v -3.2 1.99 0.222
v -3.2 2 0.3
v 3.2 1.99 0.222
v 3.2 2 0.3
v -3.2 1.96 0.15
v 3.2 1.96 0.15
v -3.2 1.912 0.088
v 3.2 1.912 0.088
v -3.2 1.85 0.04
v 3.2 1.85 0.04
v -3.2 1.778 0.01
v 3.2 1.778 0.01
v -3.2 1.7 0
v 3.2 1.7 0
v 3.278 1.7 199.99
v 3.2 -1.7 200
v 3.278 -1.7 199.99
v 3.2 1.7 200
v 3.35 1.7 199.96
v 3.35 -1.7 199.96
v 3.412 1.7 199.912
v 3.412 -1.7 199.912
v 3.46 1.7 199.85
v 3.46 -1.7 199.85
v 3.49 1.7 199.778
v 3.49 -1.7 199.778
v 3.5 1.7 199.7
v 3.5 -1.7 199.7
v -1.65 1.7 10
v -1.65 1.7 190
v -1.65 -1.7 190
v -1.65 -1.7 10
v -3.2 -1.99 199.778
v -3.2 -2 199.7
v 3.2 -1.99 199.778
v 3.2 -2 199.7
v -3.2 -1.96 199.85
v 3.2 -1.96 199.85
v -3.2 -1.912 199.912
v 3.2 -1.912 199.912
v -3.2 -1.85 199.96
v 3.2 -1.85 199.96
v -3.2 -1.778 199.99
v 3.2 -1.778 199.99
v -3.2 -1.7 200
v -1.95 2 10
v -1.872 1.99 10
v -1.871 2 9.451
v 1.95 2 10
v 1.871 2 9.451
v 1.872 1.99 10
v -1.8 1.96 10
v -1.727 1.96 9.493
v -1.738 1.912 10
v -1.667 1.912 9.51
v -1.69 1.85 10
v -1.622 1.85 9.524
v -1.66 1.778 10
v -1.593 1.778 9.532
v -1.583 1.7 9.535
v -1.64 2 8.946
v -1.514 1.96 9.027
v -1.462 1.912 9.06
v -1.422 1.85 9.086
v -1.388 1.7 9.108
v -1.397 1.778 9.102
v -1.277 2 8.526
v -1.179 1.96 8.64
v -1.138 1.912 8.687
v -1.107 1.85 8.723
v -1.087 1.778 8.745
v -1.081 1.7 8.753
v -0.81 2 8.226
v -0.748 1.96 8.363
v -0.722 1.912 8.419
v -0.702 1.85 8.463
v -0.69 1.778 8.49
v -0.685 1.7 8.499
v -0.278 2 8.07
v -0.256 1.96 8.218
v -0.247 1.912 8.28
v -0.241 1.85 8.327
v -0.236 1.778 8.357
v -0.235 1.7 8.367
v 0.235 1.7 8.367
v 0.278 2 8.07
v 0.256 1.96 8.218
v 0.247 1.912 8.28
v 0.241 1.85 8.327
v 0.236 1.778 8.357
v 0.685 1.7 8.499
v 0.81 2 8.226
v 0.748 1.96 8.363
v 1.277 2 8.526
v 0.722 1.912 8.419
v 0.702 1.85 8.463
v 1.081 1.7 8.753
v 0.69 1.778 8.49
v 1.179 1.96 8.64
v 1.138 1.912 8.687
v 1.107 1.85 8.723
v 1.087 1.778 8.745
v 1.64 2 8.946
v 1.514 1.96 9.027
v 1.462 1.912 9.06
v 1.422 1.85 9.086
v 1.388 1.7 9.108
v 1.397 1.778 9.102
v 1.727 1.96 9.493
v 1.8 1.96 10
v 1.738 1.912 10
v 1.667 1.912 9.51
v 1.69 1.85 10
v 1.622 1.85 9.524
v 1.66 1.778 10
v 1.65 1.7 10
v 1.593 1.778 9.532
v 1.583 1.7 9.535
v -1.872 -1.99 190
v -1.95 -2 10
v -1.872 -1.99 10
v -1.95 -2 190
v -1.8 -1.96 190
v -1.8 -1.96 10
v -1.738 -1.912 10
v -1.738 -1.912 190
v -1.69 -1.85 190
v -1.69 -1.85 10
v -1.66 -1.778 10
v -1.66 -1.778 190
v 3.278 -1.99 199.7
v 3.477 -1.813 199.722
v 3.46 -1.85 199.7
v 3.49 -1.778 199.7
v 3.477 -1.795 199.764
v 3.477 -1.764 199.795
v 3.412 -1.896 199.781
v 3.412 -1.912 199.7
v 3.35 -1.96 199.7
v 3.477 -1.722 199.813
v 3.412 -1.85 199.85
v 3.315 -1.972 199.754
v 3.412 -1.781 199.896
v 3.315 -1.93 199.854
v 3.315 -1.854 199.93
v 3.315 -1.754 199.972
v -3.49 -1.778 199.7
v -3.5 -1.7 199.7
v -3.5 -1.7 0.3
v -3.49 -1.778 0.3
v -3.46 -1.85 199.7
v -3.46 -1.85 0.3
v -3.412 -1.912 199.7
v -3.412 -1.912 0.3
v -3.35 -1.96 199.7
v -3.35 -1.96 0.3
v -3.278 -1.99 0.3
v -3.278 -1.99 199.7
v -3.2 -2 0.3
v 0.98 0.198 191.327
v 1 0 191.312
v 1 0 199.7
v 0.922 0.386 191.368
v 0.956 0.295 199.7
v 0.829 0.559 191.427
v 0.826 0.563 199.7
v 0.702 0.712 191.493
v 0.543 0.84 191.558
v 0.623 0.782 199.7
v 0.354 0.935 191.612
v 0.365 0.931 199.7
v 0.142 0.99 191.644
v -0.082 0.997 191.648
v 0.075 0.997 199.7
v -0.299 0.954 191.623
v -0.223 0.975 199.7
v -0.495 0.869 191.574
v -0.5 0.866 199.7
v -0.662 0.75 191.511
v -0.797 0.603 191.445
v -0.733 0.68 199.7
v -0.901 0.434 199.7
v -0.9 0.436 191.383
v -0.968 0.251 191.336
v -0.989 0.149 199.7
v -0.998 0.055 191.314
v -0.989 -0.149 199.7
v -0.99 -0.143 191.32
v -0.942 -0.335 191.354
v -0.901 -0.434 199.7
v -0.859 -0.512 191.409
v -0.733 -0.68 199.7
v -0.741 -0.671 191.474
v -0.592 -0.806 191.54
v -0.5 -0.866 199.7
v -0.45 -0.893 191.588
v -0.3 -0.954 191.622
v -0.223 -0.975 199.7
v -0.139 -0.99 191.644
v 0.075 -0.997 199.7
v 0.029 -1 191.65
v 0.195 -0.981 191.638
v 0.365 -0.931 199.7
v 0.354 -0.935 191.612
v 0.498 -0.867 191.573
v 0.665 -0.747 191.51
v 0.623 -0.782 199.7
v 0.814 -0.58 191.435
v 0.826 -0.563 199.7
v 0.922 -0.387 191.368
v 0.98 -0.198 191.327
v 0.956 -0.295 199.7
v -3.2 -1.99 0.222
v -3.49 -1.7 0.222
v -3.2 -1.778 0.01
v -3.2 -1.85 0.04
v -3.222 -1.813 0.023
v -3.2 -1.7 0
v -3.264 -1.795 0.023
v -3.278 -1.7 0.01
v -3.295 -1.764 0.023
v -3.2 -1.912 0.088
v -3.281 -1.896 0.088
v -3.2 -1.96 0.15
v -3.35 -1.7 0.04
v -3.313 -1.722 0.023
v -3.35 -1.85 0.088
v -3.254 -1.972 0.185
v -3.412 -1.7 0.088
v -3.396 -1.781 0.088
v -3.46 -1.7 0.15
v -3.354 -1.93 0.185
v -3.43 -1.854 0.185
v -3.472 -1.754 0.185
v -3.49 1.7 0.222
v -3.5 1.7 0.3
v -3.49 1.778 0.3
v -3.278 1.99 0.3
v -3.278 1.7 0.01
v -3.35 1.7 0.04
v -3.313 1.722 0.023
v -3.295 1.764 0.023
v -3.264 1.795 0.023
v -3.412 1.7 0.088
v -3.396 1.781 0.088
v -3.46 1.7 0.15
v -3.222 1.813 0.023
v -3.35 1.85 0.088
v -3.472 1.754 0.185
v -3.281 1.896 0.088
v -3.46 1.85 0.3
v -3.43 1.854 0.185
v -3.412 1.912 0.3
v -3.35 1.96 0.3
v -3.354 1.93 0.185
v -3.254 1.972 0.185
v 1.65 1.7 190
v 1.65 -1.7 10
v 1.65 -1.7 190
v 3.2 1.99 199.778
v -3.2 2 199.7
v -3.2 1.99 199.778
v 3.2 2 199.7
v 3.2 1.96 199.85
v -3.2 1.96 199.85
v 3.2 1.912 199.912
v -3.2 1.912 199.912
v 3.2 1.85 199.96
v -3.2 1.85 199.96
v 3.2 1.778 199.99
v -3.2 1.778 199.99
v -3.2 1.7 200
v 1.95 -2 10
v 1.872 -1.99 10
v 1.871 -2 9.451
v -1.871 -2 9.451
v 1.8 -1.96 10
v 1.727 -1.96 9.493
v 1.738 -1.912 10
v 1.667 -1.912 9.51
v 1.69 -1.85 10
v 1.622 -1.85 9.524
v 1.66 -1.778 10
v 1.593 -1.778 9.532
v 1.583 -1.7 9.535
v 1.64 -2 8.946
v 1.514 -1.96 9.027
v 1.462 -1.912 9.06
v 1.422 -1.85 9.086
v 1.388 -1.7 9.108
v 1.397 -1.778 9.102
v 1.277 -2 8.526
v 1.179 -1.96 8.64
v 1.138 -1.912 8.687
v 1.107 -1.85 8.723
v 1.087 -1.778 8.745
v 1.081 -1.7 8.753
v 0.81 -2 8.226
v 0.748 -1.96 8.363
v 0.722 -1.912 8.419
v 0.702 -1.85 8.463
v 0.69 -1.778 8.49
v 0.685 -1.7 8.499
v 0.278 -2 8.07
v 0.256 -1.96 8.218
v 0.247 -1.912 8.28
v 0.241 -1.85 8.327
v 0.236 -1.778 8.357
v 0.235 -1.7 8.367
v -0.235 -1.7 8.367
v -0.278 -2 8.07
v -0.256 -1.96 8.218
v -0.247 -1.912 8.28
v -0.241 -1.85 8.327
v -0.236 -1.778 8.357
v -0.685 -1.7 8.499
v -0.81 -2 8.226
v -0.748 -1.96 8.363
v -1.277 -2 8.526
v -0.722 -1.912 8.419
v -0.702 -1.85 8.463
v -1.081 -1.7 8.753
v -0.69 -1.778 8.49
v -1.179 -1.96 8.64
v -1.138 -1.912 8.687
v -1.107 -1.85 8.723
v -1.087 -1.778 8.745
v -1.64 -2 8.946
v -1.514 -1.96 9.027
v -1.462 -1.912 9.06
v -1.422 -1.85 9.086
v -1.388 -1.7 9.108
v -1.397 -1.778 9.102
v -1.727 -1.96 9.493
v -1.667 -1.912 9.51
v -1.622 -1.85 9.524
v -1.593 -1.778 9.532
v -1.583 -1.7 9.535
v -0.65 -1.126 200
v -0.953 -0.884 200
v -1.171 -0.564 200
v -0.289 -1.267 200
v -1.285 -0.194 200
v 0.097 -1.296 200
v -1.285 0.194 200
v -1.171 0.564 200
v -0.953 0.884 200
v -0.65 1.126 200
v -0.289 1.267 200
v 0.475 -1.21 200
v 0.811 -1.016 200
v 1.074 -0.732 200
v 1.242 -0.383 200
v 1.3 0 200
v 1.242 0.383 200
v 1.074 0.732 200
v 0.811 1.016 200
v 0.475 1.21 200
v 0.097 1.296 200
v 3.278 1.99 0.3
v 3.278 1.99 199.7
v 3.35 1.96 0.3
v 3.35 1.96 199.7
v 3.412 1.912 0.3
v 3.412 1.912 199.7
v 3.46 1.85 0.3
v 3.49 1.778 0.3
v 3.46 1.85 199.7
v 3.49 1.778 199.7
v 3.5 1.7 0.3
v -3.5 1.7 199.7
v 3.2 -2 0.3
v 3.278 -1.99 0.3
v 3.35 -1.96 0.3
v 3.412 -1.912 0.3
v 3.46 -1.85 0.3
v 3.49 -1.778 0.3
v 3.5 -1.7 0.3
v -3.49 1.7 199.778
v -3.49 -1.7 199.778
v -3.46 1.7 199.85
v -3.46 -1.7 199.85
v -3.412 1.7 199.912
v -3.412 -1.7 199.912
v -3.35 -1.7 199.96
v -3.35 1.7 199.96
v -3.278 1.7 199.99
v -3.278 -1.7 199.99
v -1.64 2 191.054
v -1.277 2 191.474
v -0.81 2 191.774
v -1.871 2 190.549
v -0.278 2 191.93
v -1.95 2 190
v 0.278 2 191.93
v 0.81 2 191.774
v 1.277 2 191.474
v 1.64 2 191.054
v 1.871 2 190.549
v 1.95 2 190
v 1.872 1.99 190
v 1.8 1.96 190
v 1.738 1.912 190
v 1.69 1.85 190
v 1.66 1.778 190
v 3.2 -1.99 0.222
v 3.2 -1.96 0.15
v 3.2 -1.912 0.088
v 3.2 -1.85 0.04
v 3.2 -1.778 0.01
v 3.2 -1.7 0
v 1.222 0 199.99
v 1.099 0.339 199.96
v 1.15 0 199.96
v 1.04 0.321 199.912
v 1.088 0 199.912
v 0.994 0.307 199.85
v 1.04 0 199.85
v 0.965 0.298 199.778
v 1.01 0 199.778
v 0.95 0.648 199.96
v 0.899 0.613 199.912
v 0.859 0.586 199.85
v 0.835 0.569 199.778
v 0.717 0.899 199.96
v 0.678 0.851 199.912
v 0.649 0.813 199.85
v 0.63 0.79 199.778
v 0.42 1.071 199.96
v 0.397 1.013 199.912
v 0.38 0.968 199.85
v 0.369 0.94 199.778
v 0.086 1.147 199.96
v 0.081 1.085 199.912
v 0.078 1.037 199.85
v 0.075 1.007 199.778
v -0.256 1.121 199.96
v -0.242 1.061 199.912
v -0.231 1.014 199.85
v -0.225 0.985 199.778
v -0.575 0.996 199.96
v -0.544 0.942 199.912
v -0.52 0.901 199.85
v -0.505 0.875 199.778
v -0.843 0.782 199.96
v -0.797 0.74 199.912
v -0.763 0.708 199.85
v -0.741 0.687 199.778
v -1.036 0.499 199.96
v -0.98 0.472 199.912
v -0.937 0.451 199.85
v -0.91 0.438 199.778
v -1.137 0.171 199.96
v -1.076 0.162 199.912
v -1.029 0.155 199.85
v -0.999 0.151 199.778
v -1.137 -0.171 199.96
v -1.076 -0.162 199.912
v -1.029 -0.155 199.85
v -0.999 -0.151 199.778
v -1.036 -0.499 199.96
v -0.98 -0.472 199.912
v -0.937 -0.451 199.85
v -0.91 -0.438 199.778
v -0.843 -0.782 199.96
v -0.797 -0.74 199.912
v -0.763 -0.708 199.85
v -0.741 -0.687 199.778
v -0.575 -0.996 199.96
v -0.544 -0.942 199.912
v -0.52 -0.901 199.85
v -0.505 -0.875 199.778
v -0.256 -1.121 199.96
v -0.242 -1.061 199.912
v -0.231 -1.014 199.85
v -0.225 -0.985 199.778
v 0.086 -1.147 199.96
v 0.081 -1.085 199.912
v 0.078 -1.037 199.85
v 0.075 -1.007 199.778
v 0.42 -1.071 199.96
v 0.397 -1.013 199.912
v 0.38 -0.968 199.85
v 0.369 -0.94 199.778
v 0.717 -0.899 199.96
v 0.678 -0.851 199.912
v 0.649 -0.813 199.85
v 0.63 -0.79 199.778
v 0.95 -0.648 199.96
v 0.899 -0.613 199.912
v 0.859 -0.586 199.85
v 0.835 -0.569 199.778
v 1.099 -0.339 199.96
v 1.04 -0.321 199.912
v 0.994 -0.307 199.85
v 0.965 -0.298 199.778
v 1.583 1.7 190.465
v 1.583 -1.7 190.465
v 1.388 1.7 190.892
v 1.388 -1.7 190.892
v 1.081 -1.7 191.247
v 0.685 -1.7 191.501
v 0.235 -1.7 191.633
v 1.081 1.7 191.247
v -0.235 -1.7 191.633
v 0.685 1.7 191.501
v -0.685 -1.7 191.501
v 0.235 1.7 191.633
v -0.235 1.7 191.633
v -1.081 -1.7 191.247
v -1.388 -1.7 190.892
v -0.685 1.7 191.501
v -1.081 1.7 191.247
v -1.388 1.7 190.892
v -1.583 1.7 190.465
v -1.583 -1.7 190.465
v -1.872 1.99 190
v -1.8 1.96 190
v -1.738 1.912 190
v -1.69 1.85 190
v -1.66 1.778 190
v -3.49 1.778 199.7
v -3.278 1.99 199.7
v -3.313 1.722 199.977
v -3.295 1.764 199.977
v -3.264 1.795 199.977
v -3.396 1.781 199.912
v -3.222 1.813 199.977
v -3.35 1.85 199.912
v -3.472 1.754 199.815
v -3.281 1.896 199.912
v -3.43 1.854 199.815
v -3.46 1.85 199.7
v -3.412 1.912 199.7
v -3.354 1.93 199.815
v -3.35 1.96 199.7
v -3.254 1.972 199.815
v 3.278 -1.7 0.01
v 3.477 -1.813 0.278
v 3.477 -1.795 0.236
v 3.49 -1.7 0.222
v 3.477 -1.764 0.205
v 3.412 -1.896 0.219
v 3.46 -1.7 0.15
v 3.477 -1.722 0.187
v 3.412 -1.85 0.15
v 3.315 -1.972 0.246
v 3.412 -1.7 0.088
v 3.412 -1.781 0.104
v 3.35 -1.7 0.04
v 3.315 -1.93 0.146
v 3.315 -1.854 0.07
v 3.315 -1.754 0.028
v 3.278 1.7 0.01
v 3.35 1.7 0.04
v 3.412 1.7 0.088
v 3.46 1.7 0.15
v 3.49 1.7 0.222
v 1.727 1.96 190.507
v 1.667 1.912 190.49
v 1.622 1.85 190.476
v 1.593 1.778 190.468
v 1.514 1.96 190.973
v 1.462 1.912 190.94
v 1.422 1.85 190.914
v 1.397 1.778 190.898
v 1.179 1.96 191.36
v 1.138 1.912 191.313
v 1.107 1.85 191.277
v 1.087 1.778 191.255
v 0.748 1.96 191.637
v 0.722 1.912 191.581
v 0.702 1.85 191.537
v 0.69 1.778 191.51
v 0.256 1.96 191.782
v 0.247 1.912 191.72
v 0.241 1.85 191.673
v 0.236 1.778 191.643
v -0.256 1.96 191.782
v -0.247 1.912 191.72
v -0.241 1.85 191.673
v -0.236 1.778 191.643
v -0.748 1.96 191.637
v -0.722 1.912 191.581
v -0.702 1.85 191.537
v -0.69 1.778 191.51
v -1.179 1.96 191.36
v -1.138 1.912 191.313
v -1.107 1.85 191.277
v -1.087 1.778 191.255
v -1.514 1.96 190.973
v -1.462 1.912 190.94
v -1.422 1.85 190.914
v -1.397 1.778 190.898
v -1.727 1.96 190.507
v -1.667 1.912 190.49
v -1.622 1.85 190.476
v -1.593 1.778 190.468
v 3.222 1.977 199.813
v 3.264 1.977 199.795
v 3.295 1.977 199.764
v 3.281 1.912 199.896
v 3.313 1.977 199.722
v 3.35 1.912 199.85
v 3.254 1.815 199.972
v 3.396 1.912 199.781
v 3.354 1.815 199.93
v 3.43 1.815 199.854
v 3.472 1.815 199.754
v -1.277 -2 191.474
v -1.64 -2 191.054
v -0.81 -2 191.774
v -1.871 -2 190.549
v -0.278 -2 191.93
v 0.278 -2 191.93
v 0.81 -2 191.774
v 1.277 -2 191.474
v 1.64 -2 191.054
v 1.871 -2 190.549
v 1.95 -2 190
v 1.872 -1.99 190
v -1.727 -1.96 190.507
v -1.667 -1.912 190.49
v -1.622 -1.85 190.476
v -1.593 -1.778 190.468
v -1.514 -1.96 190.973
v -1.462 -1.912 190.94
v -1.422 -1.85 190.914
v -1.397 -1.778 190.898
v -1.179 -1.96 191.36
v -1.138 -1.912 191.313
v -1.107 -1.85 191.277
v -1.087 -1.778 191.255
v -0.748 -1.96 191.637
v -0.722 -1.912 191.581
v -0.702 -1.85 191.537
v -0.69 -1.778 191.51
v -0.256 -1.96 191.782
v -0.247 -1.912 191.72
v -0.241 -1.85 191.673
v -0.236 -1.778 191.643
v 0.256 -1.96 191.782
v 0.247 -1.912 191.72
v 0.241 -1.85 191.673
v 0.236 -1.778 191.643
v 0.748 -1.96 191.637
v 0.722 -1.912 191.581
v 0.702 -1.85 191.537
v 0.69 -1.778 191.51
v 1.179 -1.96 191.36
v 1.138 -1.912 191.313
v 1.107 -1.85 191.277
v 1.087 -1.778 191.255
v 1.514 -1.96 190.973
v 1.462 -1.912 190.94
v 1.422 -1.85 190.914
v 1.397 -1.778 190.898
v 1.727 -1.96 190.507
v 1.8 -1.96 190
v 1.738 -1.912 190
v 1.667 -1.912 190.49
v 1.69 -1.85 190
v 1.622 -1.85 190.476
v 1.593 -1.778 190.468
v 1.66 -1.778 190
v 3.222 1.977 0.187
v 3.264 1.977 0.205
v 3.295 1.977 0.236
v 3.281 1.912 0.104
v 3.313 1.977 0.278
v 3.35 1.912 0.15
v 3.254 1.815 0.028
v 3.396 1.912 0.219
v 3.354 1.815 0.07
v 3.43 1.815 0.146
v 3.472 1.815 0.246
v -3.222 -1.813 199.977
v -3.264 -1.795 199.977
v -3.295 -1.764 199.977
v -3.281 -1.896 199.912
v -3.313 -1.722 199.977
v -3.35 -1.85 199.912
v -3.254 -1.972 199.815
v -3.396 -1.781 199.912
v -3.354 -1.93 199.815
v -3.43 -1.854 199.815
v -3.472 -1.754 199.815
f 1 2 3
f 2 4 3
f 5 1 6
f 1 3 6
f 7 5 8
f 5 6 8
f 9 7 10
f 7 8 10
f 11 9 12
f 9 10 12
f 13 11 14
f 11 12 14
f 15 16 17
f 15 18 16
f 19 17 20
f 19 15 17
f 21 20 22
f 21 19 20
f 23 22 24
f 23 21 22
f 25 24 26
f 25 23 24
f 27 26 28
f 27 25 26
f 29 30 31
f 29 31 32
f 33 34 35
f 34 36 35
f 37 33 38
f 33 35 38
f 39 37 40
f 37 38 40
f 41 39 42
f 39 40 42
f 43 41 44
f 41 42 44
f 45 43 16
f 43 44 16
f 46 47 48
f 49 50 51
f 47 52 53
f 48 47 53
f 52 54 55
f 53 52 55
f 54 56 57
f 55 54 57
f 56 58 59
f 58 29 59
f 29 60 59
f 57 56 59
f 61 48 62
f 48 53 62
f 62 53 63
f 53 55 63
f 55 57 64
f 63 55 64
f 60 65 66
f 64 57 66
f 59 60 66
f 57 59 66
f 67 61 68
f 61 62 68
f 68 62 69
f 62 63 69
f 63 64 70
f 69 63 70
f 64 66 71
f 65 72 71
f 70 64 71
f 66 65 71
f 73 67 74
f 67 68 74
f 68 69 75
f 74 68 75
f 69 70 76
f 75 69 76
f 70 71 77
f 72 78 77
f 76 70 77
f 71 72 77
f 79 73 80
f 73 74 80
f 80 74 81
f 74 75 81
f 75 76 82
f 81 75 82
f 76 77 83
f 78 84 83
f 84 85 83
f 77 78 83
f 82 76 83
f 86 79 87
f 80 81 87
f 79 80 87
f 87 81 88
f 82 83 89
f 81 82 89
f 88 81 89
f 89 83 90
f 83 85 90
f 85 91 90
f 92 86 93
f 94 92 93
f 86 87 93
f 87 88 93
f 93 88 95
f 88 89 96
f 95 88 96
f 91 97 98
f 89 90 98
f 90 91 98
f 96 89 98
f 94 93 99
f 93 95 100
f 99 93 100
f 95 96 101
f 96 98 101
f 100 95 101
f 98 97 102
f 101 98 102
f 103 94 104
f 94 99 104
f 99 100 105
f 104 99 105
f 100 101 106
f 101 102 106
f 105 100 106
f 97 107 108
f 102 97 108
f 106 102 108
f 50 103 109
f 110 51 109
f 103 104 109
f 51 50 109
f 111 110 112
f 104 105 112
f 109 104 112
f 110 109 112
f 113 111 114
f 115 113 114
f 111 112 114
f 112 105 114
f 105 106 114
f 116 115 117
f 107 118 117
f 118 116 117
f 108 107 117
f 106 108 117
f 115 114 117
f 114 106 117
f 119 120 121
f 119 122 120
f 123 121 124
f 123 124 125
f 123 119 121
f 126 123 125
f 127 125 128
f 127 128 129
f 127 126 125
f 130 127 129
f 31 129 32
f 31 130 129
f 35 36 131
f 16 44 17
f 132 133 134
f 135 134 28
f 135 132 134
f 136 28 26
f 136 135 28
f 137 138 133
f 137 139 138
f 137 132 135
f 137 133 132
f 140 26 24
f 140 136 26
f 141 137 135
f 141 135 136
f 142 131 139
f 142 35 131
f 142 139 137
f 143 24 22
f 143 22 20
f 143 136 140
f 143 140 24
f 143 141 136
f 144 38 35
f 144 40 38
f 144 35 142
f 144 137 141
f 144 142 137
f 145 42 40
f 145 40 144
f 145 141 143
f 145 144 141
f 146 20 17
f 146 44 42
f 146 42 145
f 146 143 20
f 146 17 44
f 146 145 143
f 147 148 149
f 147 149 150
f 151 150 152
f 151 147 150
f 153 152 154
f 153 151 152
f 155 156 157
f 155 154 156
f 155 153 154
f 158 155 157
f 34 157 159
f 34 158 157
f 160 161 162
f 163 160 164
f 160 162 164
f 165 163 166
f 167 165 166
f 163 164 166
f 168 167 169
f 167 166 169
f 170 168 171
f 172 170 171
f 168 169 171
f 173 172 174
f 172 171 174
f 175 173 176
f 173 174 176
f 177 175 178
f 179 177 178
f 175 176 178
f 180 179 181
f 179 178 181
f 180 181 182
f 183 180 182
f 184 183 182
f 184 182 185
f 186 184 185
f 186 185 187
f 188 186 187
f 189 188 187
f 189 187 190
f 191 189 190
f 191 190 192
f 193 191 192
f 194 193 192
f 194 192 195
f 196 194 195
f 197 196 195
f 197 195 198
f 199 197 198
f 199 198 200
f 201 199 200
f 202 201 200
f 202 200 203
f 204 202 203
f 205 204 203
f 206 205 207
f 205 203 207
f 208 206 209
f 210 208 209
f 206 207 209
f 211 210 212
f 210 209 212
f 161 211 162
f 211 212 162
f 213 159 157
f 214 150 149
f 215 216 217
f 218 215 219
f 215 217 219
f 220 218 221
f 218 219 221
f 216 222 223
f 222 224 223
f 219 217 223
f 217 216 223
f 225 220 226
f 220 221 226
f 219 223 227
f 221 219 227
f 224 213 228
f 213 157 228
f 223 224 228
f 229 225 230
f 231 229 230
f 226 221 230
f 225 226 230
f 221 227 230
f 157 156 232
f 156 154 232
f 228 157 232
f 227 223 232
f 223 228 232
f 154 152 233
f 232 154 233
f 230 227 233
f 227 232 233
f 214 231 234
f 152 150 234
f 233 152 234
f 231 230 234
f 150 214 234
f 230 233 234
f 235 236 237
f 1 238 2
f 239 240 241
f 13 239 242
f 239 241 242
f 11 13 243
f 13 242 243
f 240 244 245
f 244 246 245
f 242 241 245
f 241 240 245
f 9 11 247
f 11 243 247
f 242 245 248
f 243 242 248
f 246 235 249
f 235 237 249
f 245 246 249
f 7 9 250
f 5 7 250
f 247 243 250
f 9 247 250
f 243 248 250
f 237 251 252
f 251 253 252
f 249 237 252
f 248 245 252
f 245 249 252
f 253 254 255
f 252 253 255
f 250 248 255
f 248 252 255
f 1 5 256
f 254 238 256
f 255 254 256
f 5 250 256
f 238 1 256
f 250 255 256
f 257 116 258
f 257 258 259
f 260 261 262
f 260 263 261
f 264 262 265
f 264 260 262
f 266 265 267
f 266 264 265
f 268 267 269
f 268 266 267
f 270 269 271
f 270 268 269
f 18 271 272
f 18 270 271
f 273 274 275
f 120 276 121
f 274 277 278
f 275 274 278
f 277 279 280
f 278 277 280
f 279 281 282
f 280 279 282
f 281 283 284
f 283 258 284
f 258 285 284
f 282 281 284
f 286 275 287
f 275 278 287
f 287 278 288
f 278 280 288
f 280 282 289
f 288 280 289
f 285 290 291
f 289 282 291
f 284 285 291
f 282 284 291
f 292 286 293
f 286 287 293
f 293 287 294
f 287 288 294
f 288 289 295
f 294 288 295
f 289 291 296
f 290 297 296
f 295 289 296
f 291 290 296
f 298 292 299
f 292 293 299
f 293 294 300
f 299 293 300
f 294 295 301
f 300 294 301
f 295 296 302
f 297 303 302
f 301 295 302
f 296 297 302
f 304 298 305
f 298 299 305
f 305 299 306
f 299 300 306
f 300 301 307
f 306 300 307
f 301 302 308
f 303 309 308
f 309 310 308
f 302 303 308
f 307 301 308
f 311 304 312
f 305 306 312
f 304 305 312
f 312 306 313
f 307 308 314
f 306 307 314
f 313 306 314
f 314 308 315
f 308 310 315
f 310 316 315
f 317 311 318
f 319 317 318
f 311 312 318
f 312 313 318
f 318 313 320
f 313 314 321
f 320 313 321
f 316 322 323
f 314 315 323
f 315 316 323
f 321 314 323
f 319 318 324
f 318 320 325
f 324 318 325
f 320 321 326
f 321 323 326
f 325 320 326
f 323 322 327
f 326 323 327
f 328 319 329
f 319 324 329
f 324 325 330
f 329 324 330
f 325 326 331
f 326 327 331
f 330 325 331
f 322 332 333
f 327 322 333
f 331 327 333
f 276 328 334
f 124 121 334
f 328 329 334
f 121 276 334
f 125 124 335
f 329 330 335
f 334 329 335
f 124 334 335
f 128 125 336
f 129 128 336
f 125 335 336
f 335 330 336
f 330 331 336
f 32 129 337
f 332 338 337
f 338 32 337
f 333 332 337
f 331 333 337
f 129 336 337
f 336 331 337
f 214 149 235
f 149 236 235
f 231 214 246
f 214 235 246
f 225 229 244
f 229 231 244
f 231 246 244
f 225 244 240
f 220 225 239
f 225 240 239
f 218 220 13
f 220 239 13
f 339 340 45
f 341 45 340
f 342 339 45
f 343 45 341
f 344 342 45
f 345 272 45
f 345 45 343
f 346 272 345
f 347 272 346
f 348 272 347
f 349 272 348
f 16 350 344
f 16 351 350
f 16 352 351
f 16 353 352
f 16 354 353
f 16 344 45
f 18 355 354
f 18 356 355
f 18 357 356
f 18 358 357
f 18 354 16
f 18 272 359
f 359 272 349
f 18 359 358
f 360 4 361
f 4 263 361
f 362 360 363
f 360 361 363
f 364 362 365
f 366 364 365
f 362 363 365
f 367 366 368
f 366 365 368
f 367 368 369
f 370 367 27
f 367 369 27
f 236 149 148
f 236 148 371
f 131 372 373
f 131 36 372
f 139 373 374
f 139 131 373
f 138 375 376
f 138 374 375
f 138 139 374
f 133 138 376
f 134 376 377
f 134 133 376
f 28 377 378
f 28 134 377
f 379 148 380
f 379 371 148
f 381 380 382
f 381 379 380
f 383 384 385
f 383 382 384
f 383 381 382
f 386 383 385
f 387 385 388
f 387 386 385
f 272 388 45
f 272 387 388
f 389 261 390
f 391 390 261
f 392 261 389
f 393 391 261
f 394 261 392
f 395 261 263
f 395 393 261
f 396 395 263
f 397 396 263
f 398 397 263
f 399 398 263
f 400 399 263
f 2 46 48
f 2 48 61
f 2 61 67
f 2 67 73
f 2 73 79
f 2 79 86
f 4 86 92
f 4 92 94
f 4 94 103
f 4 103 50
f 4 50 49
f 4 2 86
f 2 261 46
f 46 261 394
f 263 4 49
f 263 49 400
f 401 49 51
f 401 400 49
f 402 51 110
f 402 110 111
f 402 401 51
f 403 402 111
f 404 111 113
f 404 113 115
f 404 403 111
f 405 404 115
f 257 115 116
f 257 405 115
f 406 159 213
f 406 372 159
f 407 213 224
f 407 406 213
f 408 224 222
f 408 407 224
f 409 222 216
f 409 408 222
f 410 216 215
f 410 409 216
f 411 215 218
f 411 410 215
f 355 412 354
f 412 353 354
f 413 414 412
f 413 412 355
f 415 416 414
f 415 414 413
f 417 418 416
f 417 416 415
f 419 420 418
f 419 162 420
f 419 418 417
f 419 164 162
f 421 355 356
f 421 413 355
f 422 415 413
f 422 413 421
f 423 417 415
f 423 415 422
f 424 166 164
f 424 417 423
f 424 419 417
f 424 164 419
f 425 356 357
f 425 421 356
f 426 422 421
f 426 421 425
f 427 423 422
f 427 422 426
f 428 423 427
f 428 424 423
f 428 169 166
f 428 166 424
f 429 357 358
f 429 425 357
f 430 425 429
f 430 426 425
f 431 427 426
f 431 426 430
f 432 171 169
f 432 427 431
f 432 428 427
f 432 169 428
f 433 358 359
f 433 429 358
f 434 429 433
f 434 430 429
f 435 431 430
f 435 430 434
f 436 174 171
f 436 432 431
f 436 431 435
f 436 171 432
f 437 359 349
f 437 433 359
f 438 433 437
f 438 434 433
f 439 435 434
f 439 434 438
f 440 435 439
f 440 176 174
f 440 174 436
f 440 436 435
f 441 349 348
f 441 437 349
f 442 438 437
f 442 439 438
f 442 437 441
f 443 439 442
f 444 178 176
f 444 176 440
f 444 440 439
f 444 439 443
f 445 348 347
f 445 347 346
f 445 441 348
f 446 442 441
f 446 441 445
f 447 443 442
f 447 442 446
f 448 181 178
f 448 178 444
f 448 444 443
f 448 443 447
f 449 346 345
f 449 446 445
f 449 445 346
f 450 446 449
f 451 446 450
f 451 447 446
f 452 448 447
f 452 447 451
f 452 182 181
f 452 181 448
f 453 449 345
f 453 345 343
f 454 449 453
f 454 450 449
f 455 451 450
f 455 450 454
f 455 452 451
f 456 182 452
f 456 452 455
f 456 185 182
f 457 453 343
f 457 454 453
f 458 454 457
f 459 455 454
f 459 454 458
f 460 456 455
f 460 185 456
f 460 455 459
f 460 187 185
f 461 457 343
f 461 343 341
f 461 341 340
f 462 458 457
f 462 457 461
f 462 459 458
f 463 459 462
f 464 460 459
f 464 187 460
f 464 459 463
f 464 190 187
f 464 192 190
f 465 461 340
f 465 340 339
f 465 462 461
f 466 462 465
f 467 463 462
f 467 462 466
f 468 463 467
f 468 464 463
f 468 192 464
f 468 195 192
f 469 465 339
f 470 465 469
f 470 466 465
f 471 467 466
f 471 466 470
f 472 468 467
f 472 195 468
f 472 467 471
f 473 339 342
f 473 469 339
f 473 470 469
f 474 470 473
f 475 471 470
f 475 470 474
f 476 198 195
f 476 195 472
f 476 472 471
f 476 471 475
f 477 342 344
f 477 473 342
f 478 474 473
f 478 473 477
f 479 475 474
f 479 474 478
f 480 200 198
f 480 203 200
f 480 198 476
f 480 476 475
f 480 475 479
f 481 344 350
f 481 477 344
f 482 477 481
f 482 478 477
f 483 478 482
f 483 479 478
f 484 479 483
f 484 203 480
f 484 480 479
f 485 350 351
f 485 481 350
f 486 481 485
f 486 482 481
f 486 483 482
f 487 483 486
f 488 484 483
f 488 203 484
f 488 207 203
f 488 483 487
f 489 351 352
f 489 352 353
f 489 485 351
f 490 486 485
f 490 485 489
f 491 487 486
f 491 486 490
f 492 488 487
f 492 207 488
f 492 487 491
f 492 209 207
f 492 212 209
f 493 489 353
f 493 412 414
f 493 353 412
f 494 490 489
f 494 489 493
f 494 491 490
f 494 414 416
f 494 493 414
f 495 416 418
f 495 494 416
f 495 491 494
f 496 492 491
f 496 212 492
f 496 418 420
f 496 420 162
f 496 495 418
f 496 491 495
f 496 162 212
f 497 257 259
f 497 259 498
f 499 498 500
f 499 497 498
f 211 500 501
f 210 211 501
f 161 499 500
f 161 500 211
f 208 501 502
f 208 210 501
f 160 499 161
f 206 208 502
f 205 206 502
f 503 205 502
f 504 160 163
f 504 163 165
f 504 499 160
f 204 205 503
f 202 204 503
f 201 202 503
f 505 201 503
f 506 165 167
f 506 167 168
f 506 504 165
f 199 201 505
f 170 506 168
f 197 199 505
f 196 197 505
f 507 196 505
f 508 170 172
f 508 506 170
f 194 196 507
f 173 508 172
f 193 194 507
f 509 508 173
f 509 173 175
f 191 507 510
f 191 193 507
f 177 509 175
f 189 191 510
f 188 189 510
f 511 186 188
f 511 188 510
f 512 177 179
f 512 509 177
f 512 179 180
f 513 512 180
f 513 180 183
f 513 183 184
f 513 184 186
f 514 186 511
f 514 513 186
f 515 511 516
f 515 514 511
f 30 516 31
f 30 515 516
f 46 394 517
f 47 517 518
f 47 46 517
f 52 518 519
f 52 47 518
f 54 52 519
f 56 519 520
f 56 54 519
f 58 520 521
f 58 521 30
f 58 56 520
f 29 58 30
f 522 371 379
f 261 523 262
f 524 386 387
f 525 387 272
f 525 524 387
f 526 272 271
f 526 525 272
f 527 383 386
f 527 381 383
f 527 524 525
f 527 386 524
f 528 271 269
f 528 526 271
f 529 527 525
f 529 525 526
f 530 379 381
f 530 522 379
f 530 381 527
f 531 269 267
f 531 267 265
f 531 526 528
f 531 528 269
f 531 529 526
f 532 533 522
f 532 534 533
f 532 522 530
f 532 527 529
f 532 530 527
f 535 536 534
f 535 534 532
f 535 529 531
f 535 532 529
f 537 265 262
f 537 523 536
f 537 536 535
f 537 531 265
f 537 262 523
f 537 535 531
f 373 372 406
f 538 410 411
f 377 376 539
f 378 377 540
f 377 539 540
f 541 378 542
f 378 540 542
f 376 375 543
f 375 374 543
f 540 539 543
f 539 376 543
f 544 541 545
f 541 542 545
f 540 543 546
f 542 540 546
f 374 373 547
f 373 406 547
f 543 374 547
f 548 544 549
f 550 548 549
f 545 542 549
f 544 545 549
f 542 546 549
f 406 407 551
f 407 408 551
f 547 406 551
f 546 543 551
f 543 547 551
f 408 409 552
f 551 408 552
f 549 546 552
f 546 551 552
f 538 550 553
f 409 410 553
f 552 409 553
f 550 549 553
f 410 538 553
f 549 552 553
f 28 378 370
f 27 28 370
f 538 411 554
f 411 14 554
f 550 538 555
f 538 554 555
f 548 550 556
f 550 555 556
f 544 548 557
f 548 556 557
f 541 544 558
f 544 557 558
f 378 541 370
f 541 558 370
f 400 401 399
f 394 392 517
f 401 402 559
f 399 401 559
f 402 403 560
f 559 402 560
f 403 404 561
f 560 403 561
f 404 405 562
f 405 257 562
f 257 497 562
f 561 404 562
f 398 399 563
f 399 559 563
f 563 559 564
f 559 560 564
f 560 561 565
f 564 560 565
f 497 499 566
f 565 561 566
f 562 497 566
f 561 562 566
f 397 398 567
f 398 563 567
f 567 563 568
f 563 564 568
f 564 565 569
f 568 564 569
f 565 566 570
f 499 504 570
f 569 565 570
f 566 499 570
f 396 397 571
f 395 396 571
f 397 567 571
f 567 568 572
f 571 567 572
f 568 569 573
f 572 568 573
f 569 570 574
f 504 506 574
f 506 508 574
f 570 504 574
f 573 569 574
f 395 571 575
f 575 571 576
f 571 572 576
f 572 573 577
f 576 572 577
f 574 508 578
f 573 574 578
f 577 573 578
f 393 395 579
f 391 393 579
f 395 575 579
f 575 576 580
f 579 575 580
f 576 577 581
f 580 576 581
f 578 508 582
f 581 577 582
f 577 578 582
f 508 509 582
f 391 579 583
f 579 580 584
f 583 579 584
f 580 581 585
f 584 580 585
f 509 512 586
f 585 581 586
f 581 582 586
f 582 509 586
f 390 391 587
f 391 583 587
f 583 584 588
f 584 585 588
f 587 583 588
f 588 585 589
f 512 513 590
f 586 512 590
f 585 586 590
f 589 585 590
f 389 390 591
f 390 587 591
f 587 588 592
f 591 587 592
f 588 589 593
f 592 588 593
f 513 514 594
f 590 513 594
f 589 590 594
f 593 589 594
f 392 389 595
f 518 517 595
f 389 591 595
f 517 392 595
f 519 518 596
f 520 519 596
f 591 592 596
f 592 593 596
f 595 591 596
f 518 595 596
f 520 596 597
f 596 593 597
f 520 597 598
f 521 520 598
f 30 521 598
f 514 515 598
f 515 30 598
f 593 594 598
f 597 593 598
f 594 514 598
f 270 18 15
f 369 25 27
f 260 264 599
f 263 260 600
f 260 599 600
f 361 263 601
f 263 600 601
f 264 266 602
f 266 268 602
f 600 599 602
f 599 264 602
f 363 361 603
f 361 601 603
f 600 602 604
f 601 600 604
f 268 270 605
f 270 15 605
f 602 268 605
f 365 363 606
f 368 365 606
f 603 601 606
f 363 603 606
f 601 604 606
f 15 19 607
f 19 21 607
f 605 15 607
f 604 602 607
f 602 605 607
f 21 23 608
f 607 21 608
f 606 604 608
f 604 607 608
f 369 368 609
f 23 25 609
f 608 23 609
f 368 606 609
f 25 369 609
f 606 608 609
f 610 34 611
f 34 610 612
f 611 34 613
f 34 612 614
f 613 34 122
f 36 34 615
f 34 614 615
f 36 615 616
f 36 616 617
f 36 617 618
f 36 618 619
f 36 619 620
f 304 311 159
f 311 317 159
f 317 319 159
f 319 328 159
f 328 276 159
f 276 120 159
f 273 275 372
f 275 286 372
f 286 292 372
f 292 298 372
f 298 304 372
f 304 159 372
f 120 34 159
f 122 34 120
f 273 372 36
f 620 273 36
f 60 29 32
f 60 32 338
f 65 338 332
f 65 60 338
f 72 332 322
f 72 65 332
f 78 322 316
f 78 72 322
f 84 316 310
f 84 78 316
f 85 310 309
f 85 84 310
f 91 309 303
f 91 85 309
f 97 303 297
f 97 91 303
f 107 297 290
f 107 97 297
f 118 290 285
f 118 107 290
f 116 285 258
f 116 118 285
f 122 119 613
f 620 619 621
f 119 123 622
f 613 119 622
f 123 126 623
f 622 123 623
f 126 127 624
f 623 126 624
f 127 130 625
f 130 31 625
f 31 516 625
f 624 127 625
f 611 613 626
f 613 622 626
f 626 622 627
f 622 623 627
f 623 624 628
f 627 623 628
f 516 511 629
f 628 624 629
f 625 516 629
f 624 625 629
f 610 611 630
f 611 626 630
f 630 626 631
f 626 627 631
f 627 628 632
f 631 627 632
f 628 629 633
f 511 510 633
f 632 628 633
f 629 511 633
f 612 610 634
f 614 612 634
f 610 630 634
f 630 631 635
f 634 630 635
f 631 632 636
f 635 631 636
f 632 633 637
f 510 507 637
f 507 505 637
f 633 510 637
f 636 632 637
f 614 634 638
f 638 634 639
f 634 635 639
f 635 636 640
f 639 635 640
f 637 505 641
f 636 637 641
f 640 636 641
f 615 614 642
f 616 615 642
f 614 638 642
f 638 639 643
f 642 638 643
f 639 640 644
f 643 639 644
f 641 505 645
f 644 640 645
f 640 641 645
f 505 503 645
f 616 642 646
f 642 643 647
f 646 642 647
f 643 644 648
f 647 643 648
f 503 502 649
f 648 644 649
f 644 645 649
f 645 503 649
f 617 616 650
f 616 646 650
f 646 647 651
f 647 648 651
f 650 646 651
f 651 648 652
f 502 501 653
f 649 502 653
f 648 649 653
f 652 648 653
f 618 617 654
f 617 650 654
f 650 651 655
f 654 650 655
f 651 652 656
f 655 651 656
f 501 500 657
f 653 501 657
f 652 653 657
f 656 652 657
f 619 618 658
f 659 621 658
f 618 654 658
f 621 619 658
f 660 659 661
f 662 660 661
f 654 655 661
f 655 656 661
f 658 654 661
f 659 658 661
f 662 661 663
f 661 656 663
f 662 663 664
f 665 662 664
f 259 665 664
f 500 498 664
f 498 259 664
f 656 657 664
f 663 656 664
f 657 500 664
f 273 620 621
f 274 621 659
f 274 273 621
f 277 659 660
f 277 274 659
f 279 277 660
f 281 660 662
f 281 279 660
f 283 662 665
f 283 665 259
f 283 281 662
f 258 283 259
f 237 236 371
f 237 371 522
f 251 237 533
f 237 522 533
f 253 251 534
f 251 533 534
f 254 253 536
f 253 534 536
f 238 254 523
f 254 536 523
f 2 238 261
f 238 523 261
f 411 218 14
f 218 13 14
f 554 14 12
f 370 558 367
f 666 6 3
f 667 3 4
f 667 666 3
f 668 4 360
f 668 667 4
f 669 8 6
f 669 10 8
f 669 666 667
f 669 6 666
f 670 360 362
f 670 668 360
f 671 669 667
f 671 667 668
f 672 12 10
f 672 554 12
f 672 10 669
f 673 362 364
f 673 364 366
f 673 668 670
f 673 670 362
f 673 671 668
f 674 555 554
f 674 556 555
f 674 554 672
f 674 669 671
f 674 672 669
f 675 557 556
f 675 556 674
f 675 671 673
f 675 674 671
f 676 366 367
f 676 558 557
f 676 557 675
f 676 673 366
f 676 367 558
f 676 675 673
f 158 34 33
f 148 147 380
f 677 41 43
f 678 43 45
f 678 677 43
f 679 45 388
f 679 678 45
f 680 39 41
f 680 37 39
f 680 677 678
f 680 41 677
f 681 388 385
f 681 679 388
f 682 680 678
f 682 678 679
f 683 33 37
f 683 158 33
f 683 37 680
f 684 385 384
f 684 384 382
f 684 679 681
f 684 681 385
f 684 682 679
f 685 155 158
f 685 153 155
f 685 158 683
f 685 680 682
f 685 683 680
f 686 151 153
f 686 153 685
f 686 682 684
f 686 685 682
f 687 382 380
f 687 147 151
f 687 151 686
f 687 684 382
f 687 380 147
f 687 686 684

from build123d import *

# Parameters (mm, degrees)
ESQUISSE1_W                         = 7
ESQUISSE1_H                         = 4
BOSS_EXTRU_1_DEPTH                  = 200
ENL_V_MAT_EXTRU_1_DEPTH             = 5
ESQUISSE5_R                         = 1
ENL_V_MAT_EXTRU_3_DEPTH             = 1
ENL_V_MAT_EXTRU_3_DIRECTION_2_REACH = 202
CONG_6_R                            = 0.3


with BuildPart() as part:
    # Esquisse1 → Boss.-Extru.1 (new body)
    with BuildSketch(Plane.XY):
        Rectangle(ESQUISSE1_W, ESQUISSE1_H)
    extrude(amount=BOSS_EXTRU_1_DEPTH)

    # Esquisse2 → Enlèv. mat.-Extru.1 (cut, through all)
    with BuildSketch(Plane(origin=(0, 2, 0), x_dir=(1, 0, 0), z_dir=(0, 1, 0))):
        with BuildLine():
            Line((-1.65, -190), (-1.65, -10))
            ThreePointArc((-1.65, -10), (0, -8.35), (1.65, -10))
            Line((1.65, -10), (1.65, -190))
            ThreePointArc((1.65, -190), (0, -191.65), (-1.65, -190))
        make_face()
    extrude(amount=-ENL_V_MAT_EXTRU_1_DEPTH, mode=Mode.SUBTRACT)

    # Esquisse5 → Enlèv. mat.-Extru.3 (cut)
    with BuildSketch(Plane.XY.offset(200)):
        Circle(ESQUISSE5_R)
    extrude(amount=ENL_V_MAT_EXTRU_3_DEPTH, mode=Mode.SUBTRACT)

    # Esquisse5 → Enlèv. mat.-Extru.3 direction 2 (cut, up to next)
    with BuildSketch(Plane.XY.offset(200), mode=Mode.PRIVATE) as enl_v_mat_extru_3_direction_2_sk1:
        Circle(ESQUISSE5_R)
    enl_v_mat_extru_3_direction_2_tool1 = extrude(enl_v_mat_extru_3_direction_2_sk1.sketch, amount=-ENL_V_MAT_EXTRU_3_DIRECTION_2_REACH, mode=Mode.PRIVATE) & part.part
    add(enl_v_mat_extru_3_direction_2_tool1.solids().sort_by_distance((0, 0, 200))[0], mode=Mode.SUBTRACT)

    # Congé6
    cong_6_edges = [part.edges().sort_by_distance(p)[0] for p in [
        (-3.5, -2, 100),
        (0, -2, 0),
        (0, -2, 200),
        (3.5, -2, 100),
        (0, -2, 191.65),
        (1.65, -2, 100),
        (0, -2, 8.35),
        (-1.65, -2, 100),
        (-3.5, 2, 100),
        (-3.5, 0, 0),
        (-3.5, 0, 200),
        (3.5, 0, 0),
        (0, 2, 0),
        (3.5, 0, 200),
        (0, 2, 200),
        (-1, 0, 200),
        (3.5, 2, 100),
        (0, 2, 191.65),
        (1.65, 2, 100),
        (0, 2, 8.35),
        (-1.65, 2, 100),
    ]]
    fillet(cong_6_edges, radius=CONG_6_R)


solid = part.part
